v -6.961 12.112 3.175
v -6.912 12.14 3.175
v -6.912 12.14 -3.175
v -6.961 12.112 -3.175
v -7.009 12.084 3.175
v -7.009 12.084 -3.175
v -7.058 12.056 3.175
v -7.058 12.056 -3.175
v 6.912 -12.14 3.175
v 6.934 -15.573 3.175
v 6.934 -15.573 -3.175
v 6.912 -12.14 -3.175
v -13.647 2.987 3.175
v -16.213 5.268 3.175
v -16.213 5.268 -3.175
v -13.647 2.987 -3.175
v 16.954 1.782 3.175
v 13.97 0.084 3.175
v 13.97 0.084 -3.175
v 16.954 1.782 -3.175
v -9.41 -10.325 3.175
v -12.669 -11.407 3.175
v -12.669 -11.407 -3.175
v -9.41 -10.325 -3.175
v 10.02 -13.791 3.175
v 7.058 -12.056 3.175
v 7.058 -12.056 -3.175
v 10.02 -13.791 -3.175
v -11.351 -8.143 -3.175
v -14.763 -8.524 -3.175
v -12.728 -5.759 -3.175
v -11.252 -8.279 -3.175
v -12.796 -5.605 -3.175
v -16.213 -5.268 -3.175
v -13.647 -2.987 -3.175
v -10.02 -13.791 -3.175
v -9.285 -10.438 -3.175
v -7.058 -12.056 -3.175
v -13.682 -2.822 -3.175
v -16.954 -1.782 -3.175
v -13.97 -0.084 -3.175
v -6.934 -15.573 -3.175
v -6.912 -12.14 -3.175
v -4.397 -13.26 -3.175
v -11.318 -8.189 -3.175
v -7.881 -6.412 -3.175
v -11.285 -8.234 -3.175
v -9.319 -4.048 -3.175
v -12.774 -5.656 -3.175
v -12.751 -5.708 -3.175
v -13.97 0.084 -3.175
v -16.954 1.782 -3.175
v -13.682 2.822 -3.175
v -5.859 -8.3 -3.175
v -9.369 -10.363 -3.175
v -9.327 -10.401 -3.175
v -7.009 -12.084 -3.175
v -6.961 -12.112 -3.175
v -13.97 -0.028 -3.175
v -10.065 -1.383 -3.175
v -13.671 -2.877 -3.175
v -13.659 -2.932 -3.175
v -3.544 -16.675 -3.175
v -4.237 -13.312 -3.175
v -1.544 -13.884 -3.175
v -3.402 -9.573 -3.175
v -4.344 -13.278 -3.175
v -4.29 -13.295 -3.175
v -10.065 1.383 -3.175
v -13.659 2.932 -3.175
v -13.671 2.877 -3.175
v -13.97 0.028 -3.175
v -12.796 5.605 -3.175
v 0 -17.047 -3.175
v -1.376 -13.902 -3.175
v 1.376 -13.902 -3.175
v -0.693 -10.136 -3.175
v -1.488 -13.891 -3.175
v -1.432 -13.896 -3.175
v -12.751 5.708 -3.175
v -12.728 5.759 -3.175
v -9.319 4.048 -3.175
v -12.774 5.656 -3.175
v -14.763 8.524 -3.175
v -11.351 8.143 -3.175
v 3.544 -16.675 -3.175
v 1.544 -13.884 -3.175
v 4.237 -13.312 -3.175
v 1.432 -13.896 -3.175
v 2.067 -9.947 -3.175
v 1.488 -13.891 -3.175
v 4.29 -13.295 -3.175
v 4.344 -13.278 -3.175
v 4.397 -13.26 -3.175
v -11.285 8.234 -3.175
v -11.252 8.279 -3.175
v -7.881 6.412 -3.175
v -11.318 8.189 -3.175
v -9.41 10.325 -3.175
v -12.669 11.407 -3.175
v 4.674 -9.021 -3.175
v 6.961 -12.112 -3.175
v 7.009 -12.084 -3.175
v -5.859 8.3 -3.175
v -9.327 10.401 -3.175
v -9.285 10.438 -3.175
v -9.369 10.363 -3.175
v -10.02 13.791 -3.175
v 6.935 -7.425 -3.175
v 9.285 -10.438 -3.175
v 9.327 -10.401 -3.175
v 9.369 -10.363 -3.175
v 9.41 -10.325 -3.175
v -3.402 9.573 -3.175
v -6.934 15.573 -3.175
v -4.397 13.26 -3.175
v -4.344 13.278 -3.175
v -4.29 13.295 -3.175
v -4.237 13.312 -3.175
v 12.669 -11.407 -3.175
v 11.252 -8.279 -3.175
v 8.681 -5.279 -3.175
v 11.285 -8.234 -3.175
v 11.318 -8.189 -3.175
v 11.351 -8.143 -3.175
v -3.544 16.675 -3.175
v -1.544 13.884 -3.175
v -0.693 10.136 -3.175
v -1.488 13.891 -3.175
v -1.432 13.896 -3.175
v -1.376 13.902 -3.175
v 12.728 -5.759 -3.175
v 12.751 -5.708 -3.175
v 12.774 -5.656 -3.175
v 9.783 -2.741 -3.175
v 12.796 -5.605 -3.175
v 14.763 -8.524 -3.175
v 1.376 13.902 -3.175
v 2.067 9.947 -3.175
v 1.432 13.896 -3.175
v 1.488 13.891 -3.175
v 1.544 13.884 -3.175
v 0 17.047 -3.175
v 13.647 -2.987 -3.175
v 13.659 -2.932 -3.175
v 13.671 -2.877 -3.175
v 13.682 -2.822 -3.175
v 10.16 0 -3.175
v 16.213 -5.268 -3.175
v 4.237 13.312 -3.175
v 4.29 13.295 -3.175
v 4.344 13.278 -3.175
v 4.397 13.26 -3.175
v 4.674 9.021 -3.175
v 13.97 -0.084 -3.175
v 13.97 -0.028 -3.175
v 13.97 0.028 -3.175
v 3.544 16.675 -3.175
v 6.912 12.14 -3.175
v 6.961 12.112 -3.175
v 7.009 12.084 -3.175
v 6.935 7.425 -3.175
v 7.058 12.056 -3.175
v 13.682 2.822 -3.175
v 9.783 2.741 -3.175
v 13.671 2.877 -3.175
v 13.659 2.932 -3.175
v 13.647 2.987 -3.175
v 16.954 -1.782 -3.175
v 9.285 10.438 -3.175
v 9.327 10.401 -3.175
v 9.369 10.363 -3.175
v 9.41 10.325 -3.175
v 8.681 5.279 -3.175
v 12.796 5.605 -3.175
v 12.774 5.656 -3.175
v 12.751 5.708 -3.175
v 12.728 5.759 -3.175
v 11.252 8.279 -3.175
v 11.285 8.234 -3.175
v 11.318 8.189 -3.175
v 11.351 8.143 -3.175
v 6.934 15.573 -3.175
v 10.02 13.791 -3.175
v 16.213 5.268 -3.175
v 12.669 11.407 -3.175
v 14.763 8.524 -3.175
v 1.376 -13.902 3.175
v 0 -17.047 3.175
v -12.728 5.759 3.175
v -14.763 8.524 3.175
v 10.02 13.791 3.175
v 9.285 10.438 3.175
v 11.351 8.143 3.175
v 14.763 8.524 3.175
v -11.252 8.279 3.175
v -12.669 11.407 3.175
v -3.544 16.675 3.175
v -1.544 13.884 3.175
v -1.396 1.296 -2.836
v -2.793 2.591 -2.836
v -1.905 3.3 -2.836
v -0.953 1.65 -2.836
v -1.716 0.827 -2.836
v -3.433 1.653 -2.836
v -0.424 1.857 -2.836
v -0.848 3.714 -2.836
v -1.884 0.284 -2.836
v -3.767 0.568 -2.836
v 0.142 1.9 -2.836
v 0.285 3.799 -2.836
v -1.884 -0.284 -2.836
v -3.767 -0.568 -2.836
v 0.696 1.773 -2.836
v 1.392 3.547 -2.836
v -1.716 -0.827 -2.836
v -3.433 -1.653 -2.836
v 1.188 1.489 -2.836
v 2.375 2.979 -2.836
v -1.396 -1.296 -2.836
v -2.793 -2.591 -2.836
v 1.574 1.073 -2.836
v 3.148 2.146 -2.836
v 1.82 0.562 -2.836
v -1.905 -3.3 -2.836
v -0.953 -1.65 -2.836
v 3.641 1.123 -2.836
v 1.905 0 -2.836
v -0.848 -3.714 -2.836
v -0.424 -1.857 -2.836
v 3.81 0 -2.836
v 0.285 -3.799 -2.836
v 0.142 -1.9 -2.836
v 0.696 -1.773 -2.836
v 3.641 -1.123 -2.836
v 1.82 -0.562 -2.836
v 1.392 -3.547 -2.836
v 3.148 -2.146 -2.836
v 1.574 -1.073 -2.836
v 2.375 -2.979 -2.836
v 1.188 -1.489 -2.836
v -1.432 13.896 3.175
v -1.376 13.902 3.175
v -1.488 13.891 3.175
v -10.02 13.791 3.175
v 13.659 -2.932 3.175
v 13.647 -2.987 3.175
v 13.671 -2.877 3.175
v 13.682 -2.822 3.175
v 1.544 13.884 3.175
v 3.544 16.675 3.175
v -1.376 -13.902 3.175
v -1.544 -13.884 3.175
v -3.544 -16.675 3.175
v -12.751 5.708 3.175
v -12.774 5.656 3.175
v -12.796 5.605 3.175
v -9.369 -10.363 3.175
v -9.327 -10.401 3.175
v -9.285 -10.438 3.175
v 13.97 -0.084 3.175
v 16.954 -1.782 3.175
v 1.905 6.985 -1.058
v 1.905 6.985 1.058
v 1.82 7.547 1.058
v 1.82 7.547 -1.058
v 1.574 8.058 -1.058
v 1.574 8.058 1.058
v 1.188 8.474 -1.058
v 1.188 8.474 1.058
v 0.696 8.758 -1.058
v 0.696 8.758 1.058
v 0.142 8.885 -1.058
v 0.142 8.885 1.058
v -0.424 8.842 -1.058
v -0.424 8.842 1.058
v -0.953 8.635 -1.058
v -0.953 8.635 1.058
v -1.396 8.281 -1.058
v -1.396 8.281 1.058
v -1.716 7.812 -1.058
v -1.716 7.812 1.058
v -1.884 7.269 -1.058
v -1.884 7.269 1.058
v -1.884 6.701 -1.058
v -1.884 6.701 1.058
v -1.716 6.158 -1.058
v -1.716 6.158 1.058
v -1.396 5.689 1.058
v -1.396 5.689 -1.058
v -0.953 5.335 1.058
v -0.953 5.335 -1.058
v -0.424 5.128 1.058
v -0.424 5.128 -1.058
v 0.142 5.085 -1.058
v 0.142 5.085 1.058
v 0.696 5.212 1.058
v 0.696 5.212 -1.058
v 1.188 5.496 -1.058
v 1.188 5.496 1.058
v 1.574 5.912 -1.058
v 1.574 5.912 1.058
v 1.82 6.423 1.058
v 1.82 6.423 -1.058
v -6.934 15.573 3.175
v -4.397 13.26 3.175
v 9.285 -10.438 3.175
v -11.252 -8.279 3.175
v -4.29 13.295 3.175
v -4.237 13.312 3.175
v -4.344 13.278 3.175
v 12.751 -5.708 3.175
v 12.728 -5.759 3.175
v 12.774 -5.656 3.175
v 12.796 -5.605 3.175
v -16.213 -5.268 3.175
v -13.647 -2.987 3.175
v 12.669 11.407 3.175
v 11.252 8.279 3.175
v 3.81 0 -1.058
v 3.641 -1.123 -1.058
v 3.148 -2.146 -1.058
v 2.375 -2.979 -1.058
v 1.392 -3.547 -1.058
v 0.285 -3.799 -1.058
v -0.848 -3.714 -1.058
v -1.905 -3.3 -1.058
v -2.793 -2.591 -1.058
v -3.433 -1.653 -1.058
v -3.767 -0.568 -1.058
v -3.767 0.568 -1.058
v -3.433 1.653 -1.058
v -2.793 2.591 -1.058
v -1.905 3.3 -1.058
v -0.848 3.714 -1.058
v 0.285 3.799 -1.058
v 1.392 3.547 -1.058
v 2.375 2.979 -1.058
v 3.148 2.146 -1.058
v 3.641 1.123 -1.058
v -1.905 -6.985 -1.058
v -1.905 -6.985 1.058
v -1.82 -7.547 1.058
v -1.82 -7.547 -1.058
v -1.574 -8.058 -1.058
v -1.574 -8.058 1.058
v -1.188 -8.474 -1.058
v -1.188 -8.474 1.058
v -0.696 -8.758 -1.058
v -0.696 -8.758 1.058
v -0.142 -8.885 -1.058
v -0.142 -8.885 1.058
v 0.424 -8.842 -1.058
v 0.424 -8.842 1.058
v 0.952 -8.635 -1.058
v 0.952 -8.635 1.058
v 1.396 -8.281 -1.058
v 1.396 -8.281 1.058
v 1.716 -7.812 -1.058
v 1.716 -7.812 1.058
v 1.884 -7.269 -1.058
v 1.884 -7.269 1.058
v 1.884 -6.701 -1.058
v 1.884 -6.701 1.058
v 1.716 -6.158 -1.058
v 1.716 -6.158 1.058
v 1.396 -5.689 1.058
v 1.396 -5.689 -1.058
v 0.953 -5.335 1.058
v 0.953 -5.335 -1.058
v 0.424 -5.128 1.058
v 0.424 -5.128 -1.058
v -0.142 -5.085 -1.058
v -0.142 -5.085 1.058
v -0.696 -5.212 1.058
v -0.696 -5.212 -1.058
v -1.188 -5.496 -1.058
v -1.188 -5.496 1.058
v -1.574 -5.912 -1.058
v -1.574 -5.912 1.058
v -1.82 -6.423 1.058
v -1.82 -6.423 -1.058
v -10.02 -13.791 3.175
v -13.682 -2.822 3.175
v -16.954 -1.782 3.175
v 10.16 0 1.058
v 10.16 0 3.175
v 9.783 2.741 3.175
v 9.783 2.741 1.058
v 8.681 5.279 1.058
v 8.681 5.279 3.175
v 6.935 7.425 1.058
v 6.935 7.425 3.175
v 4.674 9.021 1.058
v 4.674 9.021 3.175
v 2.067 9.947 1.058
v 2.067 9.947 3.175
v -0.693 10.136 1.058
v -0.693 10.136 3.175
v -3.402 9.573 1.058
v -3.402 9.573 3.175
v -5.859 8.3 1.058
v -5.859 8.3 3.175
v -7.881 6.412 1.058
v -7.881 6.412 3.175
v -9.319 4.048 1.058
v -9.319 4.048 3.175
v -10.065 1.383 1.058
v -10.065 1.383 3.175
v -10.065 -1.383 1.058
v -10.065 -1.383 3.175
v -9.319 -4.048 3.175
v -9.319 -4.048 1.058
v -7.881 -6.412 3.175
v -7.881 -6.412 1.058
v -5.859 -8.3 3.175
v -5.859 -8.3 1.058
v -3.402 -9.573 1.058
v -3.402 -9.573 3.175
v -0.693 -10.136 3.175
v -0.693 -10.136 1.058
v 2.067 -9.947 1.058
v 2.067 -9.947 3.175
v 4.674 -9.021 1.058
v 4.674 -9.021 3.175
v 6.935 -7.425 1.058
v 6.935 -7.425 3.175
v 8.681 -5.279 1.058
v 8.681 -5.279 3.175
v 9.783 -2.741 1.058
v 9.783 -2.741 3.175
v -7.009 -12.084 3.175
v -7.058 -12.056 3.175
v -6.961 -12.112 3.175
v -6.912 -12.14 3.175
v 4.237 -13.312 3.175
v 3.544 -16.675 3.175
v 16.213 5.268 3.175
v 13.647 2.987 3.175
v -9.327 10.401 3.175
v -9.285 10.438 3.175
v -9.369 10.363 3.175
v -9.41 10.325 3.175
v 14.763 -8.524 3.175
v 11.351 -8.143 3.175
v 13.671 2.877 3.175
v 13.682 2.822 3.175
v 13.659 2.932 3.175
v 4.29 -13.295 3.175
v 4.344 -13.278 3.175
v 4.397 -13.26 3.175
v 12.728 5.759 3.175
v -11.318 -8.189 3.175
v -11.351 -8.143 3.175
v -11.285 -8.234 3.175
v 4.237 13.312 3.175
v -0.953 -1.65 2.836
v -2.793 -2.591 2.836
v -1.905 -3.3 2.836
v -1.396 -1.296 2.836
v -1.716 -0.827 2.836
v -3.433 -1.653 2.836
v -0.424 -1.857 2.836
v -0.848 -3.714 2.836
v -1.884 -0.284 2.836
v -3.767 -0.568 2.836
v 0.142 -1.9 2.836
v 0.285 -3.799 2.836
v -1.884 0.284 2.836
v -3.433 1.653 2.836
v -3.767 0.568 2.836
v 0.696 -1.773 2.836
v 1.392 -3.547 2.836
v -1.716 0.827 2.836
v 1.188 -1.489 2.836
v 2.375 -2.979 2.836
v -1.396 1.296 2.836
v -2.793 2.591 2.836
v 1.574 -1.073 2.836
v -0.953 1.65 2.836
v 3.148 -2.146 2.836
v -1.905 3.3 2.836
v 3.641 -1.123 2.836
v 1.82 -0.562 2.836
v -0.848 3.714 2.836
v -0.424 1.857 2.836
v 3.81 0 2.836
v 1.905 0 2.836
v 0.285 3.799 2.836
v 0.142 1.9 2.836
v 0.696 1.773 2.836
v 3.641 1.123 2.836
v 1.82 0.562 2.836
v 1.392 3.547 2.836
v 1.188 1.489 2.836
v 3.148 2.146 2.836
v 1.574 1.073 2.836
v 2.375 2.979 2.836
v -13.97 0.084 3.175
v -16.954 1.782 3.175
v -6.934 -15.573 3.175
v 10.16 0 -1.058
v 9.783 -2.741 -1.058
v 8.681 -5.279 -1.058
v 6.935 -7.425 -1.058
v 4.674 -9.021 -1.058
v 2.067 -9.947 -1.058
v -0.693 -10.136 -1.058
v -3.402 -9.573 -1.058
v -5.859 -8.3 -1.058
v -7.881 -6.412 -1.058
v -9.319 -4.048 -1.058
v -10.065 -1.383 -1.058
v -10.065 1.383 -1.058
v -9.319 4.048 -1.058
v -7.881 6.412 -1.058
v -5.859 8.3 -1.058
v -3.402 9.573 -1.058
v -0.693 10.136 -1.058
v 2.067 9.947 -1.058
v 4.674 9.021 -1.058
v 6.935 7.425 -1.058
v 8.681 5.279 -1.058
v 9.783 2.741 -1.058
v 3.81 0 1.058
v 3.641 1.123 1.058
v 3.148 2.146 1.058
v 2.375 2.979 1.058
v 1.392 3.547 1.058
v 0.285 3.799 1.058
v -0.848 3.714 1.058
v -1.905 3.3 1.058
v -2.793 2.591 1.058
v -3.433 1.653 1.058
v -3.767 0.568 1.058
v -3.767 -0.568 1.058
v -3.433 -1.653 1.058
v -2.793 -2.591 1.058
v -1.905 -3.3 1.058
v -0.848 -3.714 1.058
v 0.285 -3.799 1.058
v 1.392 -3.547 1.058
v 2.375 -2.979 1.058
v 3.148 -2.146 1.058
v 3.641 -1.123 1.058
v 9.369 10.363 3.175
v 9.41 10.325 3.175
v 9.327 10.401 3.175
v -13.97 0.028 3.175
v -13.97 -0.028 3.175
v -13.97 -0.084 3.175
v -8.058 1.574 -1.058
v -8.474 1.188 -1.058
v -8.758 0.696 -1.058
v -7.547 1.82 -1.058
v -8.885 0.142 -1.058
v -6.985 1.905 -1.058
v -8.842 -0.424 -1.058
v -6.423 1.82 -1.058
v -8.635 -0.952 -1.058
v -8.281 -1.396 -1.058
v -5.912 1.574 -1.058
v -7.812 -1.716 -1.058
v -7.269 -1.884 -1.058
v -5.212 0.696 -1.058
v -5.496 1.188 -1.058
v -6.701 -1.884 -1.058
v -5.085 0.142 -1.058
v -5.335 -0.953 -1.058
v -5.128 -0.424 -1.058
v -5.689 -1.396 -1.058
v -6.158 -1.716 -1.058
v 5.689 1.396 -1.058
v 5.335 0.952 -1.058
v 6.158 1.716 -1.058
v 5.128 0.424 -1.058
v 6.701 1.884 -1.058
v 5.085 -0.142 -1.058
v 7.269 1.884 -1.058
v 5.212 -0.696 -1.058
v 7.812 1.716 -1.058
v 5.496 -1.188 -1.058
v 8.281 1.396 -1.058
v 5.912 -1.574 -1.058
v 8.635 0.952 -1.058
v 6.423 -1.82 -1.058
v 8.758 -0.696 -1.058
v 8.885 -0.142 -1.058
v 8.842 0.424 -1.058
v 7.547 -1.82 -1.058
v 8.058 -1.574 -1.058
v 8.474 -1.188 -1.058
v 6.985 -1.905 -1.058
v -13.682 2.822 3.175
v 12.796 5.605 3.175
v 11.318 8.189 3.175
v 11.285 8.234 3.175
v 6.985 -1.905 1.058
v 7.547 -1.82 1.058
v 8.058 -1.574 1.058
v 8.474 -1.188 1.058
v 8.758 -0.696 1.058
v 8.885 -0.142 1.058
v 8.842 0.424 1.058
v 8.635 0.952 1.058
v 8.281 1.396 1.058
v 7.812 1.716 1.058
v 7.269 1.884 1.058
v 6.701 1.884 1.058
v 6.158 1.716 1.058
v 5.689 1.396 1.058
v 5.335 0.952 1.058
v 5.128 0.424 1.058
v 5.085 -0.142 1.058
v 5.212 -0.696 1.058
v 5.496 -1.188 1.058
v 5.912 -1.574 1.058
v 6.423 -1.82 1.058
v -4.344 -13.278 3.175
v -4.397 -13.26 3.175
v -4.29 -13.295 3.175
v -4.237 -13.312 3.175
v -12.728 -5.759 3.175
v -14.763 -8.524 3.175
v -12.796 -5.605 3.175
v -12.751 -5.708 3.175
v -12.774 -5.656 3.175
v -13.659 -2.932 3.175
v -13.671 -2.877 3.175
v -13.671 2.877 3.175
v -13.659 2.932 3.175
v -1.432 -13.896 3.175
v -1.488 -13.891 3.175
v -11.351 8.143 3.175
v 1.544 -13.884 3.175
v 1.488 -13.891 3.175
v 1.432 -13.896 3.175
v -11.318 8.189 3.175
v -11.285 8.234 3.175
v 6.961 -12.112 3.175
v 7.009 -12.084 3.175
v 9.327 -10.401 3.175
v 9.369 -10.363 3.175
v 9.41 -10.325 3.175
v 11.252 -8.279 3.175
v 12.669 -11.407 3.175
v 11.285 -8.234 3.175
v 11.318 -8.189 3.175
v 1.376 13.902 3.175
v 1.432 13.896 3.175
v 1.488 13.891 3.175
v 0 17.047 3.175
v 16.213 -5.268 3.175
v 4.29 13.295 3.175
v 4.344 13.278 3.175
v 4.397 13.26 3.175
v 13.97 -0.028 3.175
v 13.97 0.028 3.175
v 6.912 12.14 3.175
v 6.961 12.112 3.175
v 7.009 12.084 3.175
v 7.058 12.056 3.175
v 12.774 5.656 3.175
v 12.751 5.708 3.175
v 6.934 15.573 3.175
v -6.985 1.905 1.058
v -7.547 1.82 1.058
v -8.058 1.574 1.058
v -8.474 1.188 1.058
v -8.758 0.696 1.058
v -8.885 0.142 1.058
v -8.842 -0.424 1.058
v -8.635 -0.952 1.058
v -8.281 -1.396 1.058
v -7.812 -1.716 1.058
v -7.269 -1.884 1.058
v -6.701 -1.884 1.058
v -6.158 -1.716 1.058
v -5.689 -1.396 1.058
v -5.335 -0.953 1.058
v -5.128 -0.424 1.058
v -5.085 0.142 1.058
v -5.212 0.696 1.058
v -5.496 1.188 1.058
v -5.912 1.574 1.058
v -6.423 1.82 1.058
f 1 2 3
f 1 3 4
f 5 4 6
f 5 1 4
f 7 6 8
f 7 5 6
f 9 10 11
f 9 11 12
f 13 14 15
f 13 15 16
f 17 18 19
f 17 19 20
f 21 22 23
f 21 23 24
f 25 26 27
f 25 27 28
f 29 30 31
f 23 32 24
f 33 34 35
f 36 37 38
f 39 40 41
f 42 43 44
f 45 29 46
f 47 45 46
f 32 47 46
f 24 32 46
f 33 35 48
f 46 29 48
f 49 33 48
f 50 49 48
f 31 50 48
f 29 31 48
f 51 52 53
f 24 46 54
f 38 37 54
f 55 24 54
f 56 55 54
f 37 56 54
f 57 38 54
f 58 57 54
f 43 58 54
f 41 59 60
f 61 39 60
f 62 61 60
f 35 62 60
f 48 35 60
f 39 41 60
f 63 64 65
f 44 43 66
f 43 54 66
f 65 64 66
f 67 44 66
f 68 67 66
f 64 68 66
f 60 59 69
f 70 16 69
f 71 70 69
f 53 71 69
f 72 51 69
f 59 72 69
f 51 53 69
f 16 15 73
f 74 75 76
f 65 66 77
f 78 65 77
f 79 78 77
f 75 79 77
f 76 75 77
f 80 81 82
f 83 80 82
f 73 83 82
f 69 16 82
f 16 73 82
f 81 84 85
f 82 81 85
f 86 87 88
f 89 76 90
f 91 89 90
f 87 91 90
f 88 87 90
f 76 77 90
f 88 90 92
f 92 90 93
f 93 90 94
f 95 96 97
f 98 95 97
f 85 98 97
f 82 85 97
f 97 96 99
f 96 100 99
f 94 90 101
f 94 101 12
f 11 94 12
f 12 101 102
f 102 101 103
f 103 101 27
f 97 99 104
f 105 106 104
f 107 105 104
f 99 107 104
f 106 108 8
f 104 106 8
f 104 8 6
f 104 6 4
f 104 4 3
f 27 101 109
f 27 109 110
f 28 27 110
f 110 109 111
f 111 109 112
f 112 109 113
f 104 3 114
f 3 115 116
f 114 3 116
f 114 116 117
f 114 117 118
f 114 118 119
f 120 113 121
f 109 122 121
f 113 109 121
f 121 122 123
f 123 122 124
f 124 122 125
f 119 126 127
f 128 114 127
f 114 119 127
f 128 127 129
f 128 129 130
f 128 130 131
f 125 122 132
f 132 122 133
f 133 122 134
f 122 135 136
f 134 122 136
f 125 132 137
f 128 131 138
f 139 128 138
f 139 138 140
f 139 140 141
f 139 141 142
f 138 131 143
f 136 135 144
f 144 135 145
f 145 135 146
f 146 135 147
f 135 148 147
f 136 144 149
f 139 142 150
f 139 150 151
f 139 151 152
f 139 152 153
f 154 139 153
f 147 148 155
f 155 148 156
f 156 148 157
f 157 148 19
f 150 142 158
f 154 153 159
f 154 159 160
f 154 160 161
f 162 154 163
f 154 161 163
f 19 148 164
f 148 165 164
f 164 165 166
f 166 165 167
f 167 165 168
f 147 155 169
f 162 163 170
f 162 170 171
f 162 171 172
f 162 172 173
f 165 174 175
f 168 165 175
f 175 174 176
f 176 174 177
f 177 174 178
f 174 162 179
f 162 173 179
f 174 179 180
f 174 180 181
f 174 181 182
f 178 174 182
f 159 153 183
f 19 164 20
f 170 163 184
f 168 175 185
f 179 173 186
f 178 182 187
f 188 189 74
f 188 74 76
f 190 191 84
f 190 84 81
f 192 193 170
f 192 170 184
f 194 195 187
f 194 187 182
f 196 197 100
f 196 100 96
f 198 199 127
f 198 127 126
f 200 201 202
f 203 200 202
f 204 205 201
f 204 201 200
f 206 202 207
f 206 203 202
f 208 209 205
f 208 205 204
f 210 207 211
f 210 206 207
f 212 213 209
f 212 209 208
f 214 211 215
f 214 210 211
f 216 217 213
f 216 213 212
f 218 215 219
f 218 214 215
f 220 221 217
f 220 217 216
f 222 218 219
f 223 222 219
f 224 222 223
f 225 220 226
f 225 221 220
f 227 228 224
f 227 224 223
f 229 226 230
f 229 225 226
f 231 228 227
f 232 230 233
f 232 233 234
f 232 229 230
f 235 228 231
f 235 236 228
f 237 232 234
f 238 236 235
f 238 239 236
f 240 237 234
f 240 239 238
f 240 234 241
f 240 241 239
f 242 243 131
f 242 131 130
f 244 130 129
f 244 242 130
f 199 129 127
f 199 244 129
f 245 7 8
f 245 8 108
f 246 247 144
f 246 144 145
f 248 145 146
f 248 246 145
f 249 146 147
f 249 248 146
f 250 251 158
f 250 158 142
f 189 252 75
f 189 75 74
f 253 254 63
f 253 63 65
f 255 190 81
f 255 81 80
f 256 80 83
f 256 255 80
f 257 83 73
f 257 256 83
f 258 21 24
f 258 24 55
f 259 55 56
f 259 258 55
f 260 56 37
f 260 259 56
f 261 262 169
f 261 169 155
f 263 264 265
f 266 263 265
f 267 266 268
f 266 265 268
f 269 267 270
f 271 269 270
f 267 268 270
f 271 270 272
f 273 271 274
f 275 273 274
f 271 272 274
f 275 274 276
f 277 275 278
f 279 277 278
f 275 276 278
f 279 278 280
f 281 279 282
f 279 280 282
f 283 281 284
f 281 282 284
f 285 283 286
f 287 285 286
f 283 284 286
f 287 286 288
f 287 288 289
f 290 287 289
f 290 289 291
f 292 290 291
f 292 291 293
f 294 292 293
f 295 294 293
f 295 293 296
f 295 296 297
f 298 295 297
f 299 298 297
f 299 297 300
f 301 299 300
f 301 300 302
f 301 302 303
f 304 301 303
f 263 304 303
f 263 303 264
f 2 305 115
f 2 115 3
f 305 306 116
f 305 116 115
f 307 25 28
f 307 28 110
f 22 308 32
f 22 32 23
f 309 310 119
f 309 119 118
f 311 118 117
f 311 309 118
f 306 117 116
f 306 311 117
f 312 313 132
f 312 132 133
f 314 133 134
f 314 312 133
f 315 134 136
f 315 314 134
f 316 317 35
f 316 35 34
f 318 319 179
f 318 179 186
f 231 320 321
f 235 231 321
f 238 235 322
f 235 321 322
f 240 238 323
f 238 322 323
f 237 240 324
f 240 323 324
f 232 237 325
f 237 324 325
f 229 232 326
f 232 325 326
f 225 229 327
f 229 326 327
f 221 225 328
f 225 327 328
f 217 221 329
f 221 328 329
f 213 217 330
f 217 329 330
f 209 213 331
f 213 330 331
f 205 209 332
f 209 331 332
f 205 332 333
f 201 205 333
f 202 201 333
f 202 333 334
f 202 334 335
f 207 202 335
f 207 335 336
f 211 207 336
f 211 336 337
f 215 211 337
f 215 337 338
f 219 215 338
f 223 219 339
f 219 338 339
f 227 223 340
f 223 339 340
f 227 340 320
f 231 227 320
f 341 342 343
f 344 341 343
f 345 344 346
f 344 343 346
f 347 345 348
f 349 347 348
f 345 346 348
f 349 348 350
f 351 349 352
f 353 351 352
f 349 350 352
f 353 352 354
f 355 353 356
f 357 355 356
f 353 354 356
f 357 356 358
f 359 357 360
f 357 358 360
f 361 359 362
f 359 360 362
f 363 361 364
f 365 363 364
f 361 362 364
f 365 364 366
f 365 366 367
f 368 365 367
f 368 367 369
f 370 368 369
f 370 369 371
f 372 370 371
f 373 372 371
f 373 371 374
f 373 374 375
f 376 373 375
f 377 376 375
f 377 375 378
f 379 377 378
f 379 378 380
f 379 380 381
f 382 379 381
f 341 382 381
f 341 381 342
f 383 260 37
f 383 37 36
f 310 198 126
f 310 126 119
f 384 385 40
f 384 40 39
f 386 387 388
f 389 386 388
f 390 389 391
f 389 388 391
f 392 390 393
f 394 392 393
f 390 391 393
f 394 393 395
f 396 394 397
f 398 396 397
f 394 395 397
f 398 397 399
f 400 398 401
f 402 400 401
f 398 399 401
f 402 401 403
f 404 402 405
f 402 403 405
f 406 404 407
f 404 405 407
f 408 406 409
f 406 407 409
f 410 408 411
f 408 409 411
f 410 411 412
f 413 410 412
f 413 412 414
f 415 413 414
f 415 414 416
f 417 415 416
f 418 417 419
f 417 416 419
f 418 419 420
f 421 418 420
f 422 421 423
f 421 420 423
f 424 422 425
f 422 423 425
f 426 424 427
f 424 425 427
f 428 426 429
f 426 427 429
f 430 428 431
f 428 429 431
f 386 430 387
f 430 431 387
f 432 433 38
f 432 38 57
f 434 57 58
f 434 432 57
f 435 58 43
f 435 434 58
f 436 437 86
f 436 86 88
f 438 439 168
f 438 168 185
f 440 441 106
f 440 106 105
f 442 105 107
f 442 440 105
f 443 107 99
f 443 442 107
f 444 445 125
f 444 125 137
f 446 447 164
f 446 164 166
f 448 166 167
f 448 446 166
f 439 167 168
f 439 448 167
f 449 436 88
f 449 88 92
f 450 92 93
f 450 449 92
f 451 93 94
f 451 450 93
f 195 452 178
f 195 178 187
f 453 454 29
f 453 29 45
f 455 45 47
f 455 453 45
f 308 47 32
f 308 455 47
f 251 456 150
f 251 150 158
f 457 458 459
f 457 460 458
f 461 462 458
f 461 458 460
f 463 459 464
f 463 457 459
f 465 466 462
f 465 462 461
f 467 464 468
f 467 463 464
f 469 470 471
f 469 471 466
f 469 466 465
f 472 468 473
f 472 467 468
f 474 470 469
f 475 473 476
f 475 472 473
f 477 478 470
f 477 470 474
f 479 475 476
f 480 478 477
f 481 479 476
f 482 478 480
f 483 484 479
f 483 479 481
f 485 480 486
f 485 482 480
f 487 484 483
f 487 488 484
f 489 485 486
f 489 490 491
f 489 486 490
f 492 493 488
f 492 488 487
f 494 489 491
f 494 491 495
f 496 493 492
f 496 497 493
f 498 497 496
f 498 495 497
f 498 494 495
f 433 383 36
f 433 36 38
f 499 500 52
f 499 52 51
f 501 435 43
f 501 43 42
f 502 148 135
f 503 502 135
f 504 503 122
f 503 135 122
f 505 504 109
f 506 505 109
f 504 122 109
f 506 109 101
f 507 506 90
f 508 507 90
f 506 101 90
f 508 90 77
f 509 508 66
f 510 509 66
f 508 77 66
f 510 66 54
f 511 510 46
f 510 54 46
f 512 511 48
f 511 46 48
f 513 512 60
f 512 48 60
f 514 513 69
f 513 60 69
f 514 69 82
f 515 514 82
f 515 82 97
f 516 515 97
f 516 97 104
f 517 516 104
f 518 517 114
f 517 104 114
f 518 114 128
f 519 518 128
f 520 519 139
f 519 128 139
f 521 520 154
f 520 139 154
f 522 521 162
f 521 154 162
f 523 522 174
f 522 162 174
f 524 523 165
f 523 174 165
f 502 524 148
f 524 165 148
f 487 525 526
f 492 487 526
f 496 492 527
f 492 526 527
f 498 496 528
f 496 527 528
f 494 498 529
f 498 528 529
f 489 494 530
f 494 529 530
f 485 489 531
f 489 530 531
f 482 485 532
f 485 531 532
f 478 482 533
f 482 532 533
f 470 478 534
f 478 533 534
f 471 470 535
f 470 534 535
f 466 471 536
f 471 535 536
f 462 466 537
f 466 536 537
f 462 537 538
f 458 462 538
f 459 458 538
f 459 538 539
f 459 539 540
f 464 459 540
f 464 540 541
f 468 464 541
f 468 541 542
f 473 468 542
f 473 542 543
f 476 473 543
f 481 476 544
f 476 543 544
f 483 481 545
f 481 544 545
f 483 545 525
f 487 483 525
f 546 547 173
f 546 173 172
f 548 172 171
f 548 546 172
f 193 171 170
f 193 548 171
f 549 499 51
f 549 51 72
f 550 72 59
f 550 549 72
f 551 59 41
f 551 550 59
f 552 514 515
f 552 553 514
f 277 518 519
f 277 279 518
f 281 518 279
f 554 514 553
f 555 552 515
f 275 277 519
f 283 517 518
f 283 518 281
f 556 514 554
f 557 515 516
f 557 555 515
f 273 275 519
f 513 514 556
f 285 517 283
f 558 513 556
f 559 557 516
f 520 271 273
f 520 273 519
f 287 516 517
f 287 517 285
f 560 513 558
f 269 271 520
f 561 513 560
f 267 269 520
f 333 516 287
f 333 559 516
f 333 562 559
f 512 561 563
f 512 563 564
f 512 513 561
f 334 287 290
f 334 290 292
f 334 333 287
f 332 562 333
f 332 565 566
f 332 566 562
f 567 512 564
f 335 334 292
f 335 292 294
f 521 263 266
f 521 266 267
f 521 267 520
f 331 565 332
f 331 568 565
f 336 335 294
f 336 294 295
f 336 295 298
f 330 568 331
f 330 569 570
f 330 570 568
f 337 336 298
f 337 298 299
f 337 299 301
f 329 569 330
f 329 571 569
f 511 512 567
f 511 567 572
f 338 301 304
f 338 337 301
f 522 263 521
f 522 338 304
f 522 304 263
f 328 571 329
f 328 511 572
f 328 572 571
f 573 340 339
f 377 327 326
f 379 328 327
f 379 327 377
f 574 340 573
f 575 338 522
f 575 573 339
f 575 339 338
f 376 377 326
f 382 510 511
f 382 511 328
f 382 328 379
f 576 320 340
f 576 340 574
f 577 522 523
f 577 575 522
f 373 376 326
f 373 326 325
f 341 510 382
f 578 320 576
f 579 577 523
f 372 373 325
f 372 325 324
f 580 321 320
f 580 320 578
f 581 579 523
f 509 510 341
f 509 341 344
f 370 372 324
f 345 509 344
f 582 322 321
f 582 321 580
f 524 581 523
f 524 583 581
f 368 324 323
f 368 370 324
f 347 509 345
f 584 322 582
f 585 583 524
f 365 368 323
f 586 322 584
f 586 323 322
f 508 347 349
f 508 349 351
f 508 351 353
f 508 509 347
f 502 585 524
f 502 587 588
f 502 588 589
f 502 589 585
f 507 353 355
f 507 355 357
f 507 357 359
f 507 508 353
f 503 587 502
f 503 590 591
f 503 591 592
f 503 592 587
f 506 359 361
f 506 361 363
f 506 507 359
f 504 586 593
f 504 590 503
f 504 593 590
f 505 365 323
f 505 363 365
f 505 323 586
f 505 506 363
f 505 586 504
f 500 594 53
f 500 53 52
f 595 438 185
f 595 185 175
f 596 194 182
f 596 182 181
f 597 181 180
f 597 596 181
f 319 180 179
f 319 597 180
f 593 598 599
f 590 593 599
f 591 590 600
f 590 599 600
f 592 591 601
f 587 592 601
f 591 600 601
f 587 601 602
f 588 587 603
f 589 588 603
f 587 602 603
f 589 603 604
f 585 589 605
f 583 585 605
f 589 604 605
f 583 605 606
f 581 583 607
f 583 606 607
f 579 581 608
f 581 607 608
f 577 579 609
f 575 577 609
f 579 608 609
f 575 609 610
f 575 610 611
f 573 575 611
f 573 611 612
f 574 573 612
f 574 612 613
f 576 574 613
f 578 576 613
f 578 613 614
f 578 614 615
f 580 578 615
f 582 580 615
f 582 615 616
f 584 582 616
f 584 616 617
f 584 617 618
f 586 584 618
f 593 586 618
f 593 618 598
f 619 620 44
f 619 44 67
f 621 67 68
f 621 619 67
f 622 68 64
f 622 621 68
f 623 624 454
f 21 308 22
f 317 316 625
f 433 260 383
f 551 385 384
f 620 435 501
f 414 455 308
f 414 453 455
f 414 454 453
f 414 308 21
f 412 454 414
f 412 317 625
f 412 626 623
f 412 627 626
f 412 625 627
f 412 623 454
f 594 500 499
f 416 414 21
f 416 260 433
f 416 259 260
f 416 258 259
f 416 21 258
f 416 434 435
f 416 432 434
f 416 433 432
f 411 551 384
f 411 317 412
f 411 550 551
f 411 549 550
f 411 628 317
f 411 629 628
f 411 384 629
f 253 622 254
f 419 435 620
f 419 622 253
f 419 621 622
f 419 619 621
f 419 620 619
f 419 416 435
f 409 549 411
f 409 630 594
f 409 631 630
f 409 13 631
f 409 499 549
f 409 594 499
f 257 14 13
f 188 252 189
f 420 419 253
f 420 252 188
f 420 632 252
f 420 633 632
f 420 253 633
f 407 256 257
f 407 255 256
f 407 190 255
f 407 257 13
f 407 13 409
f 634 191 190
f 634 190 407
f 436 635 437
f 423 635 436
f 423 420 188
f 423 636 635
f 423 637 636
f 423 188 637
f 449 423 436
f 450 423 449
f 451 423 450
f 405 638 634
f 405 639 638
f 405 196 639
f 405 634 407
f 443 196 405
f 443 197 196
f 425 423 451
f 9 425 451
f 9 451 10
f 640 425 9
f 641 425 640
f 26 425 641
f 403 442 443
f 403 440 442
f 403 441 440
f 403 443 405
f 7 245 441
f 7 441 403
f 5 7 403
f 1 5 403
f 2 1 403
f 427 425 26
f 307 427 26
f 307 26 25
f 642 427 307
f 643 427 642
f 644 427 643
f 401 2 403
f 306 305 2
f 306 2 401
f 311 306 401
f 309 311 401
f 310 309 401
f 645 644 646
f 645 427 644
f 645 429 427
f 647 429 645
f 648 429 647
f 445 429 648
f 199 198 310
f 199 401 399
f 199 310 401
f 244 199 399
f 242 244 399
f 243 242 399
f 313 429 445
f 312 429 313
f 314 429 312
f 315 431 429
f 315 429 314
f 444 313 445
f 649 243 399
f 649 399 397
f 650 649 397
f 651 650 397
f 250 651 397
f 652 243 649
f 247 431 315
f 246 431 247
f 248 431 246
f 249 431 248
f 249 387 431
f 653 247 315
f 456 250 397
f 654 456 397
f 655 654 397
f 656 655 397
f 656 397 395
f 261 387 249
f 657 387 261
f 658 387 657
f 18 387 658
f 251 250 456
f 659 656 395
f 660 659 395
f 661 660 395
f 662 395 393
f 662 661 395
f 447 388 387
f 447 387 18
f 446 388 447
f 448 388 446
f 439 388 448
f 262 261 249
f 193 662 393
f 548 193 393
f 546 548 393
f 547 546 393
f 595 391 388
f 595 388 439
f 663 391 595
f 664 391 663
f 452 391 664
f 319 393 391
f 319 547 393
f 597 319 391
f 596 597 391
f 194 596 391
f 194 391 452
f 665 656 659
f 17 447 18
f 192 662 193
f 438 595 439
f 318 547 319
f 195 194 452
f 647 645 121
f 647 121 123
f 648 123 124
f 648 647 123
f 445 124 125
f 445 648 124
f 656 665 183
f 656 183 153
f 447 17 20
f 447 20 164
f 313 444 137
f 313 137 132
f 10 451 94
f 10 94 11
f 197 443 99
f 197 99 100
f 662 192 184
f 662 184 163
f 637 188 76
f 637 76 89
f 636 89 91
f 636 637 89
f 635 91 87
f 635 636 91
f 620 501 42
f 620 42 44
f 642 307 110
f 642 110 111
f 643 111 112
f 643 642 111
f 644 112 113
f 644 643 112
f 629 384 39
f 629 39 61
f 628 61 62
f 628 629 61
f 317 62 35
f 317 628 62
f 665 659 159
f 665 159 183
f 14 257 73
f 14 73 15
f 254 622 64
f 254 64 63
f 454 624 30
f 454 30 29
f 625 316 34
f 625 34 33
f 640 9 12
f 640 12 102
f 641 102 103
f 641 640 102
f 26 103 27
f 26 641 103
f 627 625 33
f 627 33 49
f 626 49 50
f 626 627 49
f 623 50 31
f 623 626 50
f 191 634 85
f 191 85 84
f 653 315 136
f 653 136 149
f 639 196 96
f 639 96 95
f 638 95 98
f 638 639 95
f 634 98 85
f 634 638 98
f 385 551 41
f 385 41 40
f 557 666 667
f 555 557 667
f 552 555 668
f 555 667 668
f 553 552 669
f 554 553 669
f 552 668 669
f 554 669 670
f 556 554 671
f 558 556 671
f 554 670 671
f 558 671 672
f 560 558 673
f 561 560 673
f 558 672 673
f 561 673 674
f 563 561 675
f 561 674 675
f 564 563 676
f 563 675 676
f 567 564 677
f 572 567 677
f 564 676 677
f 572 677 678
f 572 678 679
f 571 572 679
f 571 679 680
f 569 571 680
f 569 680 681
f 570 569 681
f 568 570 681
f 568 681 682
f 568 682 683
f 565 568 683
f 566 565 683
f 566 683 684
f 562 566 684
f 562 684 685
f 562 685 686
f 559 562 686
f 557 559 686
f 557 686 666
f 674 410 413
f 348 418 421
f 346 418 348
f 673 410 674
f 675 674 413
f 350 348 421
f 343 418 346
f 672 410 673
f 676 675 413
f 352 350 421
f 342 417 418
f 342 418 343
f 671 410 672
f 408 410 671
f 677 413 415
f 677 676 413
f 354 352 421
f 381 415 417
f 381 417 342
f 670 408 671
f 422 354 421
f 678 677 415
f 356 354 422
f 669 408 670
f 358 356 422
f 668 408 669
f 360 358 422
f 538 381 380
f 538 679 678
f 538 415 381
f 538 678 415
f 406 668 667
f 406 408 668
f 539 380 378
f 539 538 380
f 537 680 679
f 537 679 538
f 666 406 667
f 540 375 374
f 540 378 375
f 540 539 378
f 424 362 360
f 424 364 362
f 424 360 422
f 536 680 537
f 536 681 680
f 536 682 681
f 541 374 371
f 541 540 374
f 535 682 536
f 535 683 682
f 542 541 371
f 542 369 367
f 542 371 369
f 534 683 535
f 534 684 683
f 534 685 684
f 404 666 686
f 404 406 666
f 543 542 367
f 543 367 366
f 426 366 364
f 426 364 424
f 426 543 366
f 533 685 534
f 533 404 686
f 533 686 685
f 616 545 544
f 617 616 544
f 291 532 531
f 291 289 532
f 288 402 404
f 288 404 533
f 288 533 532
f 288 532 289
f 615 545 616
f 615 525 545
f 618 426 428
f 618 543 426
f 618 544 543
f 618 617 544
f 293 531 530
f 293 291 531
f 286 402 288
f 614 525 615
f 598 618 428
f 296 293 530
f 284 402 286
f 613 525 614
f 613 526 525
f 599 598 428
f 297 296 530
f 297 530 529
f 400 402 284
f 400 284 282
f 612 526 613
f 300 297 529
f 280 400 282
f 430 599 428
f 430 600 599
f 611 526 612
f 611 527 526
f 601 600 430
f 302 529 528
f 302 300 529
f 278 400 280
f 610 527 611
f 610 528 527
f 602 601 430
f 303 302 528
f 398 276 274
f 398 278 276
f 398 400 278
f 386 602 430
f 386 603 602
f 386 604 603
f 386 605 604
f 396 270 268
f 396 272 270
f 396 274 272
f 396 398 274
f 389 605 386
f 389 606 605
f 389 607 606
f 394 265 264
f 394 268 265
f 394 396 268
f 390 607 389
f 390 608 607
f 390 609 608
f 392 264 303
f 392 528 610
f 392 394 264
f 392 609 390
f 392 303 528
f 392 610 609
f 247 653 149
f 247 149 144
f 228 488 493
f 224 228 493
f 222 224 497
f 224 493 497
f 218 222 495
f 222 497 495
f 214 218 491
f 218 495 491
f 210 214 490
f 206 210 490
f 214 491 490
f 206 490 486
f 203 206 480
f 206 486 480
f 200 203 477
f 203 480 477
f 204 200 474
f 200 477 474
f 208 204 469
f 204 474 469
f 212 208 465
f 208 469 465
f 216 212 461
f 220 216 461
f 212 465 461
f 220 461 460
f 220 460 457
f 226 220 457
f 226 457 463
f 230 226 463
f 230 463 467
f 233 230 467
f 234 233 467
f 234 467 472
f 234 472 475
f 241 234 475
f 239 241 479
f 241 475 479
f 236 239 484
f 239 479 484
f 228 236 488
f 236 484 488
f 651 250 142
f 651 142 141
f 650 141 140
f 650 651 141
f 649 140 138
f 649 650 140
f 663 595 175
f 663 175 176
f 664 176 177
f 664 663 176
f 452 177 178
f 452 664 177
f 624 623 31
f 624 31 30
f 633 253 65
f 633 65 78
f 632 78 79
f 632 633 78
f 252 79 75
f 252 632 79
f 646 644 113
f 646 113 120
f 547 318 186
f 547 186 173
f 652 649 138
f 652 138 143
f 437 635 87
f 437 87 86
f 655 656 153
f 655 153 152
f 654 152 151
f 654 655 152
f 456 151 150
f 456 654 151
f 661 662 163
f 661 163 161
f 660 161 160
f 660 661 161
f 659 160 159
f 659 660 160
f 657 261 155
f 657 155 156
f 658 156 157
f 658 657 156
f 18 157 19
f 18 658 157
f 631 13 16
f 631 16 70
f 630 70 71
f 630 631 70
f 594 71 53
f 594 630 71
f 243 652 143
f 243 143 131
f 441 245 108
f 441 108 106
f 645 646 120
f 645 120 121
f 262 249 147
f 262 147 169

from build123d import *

# Parameters (mm, degrees)
F0_R             = 13.97
F1_DEPTH         = 3.175
F2_R             = 10.16
F3_DEPTH         = 2.1166666667
F4_R             = 10.16
F5_DEPTH         = 2.1166666667
F6_R             = 1.905
F7_DEPTH         = 2.54
F7_COPIES_COUNT  = 4
F8_R             = 3.81
F9_DEPTH         = 1.778
F10_R            = 3.81
F11_DEPTH        = 1.778
F13_DEPTH        = 6.35
F13_COPIES_COUNT = 30
F14_R            = 1.905
F15_DEPTH        = 5.6726666667


# Not quite as in the source:
# - a pattern or mirror of a feature is missing from the dataset's text; its kind, count and spacing are read off the source's solid


with BuildPart() as f1:
    # F0 (on Top) → F1 (new body, symmetric)
    with BuildSketch(Plane.XY):
        Circle(F0_R)
    extrude(amount=F1_DEPTH, both=True)

    # F2 (on face) → F3 (cut)
    with BuildSketch(Plane.XY.offset(3.175)):
        Circle(F2_R)
    extrude(amount=-F3_DEPTH, mode=Mode.SUBTRACT)

    # F4 (on face) → F5 (cut)
    with BuildSketch(Plane(origin=(0, 0, -3.175), x_dir=(1, 0, 0), z_dir=(0, 0, -1))):
        Circle(F4_R)
    extrude(amount=-F5_DEPTH, mode=Mode.SUBTRACT)

    # F6 (on face) → F7 (cut)
    with BuildSketch(Plane.XY.offset(1.0583333333)):
        with Locations((0, 6.985)):
            Circle(F6_R)
    f7 = extrude(amount=-F7_DEPTH, mode=Mode.SUBTRACT)

    # F7_copies: F7 ×4 about axis
    f7_copies_axis = Axis((0, 0, 0), (0, 0, 1))
    for i in range(1, F7_COPIES_COUNT):
        add(f7.rotate(f7_copies_axis, i * 360 / F7_COPIES_COUNT), mode=Mode.SUBTRACT)

    # F8 (on face) → F9 (join)
    with BuildSketch(Plane.XY.offset(1.0583333333)):
        Circle(F8_R)
    extrude(amount=F9_DEPTH)

    # F10 (on face) → F11 (join)
    with BuildSketch(Plane(origin=(0, 0, -1.0583333333), x_dir=(1, 0, 0), z_dir=(0, 0, -1))):
        Circle(F10_R)
    extrude(amount=F11_DEPTH)

    # F12 (on face) → F13 (join, through all)
    with BuildSketch(Plane.XY.offset(3.175)):
        Polygon((0, 17.0471984893), (-1.3763362913, 13.9020357651), (1.3763362913, 13.9020357651), align=None)
    f13 = extrude(amount=-F13_DEPTH)

    # F13_copies: F13 ×30 about axis
    f13_copies_axis = Axis((0, 0, 0), (0, 0, 1))
    for i in range(1, F13_COPIES_COUNT):
        add(f13.rotate(f13_copies_axis, i * 360 / F13_COPIES_COUNT))

    # F14 (on face) → F15 (cut, through all)
    with BuildSketch(Plane.XY.offset(2.8363333333)):
        Circle(F14_R)
    extrude(amount=-F15_DEPTH, mode=Mode.SUBTRACT)


solid = f1.part
